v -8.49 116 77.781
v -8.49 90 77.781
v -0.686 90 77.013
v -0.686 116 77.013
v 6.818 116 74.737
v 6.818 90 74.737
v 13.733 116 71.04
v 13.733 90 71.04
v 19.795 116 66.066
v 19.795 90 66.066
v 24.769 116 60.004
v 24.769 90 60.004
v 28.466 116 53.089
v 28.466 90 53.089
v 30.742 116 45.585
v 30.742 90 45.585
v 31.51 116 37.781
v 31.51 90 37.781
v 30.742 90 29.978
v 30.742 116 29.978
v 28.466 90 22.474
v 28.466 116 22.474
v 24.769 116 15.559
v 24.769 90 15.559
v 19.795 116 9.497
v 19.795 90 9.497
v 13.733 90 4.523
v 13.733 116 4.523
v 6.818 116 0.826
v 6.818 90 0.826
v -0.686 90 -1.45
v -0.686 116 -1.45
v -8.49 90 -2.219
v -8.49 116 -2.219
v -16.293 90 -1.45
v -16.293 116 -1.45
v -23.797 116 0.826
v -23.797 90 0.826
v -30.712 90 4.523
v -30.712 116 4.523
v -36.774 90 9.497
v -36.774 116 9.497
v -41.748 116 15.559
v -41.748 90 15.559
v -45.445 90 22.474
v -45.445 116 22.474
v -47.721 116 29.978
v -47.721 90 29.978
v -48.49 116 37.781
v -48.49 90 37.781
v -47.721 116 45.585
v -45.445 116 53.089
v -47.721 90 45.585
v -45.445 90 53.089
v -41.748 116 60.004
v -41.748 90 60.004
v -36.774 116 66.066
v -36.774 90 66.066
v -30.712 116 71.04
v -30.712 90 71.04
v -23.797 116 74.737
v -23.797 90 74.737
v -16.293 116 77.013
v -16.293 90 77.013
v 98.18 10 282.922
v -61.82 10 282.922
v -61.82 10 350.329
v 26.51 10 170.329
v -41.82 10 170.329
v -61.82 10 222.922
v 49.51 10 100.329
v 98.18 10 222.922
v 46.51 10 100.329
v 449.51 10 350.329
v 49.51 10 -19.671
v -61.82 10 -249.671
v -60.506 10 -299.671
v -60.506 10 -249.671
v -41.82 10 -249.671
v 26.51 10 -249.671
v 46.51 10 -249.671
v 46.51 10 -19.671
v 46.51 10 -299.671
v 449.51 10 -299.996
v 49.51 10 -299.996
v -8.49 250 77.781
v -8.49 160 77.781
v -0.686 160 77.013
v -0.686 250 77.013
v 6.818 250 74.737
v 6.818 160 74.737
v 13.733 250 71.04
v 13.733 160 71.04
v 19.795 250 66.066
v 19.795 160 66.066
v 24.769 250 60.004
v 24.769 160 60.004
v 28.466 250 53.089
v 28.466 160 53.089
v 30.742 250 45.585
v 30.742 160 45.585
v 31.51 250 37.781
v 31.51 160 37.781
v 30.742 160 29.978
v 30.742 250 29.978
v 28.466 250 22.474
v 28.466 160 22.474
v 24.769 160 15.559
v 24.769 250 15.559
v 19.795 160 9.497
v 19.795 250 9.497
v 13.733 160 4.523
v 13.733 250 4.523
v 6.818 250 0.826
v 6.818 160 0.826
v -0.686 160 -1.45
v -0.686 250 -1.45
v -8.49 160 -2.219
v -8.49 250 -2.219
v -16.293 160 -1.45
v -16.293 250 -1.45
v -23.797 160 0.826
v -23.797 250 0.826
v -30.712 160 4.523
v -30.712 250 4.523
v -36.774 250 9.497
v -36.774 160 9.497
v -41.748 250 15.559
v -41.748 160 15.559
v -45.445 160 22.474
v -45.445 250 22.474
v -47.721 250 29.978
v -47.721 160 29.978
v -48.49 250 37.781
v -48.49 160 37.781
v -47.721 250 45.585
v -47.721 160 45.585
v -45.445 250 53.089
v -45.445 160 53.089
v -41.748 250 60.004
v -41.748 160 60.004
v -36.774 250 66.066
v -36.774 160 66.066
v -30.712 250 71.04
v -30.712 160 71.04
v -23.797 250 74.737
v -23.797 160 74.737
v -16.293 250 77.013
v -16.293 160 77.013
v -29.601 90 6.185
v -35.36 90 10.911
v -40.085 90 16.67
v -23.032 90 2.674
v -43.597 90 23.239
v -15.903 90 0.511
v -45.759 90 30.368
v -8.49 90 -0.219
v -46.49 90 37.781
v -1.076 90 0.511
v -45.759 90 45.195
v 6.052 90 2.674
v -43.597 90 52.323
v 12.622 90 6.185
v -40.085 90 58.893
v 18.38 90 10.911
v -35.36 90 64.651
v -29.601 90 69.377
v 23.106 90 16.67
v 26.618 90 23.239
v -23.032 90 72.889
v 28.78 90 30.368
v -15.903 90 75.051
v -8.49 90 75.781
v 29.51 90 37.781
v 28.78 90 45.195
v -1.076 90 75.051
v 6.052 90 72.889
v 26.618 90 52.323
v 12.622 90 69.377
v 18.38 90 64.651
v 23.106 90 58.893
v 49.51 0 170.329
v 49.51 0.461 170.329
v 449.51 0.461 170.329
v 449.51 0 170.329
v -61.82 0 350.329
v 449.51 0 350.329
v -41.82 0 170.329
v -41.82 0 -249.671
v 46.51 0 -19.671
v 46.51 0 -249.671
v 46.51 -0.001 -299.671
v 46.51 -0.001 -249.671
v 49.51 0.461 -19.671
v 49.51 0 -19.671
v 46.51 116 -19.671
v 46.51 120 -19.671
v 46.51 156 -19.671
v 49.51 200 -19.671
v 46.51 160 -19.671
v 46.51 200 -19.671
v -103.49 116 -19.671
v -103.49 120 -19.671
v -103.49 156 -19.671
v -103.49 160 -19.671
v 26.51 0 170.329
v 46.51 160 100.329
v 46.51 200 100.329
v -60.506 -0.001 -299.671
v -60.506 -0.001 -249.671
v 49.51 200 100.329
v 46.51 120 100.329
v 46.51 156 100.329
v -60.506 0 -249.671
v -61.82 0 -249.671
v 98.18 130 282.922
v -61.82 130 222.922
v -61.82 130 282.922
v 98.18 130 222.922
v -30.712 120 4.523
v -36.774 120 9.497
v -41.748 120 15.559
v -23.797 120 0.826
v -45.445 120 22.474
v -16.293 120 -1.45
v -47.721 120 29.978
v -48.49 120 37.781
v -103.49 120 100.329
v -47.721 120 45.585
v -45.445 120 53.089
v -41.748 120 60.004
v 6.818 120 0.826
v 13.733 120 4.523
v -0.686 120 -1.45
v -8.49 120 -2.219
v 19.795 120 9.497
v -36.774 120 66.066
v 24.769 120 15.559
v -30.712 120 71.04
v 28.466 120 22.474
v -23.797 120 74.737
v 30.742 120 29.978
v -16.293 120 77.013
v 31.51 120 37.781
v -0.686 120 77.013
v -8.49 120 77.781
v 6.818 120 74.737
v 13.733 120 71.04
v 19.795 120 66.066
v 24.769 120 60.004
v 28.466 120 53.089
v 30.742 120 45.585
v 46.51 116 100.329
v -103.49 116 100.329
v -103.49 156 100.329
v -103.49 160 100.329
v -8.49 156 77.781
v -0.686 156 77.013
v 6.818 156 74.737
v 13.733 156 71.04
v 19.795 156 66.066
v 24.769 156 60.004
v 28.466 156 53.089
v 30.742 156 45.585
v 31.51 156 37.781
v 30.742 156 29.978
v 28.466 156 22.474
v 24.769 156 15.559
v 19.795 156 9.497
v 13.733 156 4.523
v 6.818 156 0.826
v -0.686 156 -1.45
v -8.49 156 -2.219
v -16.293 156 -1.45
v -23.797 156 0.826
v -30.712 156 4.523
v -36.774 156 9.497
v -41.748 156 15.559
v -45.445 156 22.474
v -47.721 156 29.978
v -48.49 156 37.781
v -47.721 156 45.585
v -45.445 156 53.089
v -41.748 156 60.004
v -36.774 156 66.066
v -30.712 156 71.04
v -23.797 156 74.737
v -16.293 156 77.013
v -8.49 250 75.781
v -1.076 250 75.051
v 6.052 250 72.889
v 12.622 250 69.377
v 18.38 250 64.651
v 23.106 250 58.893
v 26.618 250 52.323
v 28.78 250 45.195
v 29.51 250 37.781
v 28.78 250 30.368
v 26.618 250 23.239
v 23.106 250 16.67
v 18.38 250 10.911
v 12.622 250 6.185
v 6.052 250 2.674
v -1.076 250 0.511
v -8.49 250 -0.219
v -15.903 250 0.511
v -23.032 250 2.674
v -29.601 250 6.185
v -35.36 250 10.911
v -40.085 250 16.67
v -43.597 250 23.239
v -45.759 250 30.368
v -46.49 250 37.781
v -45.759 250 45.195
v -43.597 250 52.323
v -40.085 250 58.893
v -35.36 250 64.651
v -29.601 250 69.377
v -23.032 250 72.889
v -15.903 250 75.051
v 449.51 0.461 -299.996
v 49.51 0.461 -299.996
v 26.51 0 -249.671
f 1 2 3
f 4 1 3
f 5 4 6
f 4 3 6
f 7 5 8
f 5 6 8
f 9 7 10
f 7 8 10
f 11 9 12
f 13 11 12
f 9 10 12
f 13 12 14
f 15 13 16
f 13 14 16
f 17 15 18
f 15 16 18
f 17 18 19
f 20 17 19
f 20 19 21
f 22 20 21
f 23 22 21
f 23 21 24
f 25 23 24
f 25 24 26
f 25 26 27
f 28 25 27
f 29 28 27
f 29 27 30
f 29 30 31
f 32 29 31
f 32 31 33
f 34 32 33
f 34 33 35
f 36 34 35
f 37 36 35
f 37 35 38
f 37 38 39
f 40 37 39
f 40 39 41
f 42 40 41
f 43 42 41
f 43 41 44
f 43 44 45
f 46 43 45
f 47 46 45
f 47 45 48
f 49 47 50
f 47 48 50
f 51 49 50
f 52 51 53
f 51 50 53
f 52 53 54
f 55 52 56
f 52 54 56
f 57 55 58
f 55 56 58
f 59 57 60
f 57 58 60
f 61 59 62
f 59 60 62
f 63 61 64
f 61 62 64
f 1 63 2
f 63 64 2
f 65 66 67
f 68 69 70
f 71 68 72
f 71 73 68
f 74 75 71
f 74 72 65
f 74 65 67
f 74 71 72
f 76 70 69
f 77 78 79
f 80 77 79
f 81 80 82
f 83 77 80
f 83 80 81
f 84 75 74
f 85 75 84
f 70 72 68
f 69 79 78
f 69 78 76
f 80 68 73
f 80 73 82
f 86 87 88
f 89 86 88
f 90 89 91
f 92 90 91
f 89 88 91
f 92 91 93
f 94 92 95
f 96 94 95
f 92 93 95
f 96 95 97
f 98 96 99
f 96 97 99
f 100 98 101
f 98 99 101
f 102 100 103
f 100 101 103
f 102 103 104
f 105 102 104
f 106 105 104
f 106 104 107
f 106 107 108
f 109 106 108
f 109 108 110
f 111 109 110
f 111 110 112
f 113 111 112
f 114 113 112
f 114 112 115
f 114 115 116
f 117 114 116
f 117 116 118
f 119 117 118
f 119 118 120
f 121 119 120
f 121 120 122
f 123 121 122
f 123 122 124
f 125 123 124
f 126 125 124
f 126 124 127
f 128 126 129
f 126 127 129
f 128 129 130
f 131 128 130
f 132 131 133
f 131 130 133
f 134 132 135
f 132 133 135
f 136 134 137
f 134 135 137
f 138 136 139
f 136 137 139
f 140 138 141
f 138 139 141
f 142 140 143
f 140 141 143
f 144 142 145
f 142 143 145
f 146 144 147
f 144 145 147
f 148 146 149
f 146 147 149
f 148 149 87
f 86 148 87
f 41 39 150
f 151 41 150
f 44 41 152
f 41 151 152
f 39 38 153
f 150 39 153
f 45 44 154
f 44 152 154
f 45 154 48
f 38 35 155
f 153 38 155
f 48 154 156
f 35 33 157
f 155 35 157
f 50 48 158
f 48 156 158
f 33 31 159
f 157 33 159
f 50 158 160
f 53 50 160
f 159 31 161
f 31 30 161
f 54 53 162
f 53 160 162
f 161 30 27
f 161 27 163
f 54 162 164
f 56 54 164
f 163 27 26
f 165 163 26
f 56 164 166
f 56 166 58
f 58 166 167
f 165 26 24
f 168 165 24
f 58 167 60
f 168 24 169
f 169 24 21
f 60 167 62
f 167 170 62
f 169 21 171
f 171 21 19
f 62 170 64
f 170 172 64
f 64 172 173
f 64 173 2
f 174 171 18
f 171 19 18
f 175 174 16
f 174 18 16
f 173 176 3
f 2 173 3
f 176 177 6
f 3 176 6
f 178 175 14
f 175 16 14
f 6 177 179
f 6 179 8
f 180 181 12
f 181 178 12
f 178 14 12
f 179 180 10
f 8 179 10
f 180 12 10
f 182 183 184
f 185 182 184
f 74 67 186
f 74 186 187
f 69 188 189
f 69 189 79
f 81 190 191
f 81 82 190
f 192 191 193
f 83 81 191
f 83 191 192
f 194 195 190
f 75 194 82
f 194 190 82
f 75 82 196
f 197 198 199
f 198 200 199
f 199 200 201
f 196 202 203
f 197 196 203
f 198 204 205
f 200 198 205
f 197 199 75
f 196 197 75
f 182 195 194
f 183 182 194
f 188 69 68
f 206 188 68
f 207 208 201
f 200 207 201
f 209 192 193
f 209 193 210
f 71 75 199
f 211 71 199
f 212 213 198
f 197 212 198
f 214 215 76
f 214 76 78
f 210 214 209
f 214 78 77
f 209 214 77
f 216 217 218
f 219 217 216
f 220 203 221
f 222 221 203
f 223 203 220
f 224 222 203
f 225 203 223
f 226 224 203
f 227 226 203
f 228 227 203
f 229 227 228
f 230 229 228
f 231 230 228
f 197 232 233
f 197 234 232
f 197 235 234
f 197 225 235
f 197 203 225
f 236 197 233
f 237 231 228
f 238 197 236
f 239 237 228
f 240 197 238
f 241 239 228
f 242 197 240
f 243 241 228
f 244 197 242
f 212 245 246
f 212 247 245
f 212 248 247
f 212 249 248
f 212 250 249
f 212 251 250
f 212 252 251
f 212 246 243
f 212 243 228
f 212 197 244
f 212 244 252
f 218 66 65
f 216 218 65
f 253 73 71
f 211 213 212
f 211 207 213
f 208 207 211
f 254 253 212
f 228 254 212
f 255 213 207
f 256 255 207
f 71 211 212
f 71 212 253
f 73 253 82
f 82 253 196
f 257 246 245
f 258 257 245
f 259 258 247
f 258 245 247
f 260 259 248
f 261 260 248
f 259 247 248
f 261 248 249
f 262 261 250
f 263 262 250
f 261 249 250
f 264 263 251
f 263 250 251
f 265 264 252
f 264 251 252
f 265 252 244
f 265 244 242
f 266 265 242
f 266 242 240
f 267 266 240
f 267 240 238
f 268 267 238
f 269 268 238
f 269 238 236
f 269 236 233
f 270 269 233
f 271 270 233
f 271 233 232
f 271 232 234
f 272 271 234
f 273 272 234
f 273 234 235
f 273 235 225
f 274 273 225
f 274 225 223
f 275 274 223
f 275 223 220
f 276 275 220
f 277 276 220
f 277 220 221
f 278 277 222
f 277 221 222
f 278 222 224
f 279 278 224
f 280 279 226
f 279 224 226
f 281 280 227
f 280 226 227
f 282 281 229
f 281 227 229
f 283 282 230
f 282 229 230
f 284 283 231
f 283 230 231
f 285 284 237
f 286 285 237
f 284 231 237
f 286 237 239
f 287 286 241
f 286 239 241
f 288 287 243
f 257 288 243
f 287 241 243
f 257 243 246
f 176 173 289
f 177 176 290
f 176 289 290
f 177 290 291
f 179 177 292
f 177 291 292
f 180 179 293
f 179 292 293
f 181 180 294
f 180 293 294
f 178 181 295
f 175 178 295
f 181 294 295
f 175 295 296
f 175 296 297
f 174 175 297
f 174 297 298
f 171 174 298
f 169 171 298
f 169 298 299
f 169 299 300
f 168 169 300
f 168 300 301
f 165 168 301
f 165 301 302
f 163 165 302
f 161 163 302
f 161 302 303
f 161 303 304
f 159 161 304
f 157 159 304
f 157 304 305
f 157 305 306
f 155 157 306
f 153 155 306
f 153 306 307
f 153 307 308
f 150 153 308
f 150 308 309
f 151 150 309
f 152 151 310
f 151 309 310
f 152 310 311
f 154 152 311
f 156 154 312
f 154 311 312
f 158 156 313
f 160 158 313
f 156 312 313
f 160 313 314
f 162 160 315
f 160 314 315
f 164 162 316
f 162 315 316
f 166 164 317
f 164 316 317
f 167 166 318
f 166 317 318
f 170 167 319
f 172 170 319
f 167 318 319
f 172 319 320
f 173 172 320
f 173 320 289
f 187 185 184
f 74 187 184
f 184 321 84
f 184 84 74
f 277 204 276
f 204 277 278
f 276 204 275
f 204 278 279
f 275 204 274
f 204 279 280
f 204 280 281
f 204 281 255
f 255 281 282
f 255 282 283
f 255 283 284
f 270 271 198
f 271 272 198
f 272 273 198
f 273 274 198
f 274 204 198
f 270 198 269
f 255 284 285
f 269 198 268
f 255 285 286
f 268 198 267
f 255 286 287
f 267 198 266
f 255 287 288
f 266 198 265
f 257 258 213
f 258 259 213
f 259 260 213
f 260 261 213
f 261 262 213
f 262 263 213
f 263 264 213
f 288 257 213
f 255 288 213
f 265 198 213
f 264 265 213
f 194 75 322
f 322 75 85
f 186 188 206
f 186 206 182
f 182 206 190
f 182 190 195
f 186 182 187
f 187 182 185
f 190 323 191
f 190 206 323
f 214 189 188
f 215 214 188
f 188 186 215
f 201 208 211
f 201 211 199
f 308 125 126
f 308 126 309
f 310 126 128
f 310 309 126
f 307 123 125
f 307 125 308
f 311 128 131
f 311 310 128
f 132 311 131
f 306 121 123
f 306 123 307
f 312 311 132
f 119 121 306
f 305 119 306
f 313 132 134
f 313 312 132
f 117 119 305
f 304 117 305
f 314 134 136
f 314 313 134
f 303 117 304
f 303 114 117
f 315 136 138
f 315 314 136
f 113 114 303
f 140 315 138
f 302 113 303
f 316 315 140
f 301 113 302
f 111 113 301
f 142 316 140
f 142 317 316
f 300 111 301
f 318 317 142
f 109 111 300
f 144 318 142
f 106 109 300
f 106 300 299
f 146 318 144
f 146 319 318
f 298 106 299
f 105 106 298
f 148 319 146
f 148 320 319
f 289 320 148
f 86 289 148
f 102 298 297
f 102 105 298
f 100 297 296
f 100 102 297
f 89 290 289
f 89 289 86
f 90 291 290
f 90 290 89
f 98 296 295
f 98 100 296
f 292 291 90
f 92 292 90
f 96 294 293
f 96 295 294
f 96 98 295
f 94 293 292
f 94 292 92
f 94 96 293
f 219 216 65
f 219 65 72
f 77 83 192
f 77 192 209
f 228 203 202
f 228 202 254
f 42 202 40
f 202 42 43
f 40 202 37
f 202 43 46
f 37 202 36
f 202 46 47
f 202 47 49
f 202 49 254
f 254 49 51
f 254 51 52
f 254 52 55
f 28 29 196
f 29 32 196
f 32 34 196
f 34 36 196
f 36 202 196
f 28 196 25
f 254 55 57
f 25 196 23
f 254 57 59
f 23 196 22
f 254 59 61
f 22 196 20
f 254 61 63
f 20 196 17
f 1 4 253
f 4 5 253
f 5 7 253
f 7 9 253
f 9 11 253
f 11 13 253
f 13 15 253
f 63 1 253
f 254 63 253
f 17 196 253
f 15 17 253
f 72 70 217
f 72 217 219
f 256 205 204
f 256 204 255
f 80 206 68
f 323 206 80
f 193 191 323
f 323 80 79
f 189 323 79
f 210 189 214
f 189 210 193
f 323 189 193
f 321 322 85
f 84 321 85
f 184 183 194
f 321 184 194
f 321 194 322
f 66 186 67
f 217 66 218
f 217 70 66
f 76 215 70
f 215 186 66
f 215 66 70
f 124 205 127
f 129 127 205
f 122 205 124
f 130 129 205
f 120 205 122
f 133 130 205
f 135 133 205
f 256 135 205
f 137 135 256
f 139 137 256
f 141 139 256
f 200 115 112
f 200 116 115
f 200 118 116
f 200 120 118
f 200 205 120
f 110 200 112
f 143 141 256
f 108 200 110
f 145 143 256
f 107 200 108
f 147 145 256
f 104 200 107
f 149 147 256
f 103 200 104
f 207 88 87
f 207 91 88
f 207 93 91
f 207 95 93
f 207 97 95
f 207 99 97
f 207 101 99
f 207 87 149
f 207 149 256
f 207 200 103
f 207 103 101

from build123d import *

# Parameters (mm, degrees)
SKETCH1_W                = 20
SKETCH1_H                = 350
BOSS_EXTRUDE1_DEPTH      = 10
BOSS_EXTRUDE1_2_DEPTH    = 10
BOSS_EXTRUDE2_DEPTH      = 0.001
BOSS_EXTRUDE2_DEPTH_BACK = 10
SKETCH2_W                = 107.015982705
SKETCH2_H                = 50
SKETCH3_W                = 120
SKETCH3_H                = 200
BOSS_EXTRUDE3_DEPTH      = 3
SKETCH4_W                = 120
SKETCH4_H                = 4
BOSS_EXTRUDE4_DEPTH      = 150
SKETCH5_R                = 40
CUT_EXTRUDE1_DEPTH       = 90
BOSS_EXTRUDE5_DEPTH      = 90
BOSS_EXTRUDE5_DEPTH_BACK = 70
SKETCH6_R                = 40
SKETCH7_R                = 38
CUT_EXTRUDE2_DEPTH       = 176
SKETCH8_W                = 20
SKETCH8_H                = 10
SKETCH8_W_2              = 23
BOSS_EXTRUDE6_DEPTH      = 70
SKETCH9_W                = 470.324280976
SKETCH9_H                = 9.538817488
BOSS_EXTRUDE7_DEPTH      = 400
SKETCH10_W               = 511.33
SKETCH10_H               = 10
BOSS_EXTRUDE8_DEPTH      = 180
SKETCH11_W               = 160
SKETCH11_H               = 60
BOSS_EXTRUDE9_DEPTH      = 120


with BuildPart() as part:
    # Sketch1 → Boss-Extrude1 (new body)
    with BuildSketch(Plane(origin=(0, 0, 0), x_dir=(1, 0, 0), z_dir=(0, 1, 0))):
        with Locations((-51.819592314, 74.671278777)):
            Rectangle(SKETCH1_W, SKETCH1_H)
    extrude(amount=BOSS_EXTRUDE1_DEPTH)



with BuildPart() as body_2:
    # Sketch1 → Boss-Extrude1 2 (new body)
    with BuildSketch(Plane(origin=(0, 0, 0), x_dir=(1, 0, 0), z_dir=(0, 1, 0))):
        with Locations((36.510407686, 74.671278777)):
            Rectangle(SKETCH1_W, SKETCH1_H)
    extrude(amount=BOSS_EXTRUDE1_2_DEPTH)


with BuildPart() as part_1:
    add(part.part)

    add(body_2.part)  # Boss-Extrude2 merges body 2
    # Sketch2 → Boss-Extrude2 (add, two sides: drawn at the far end of the back side and taken through both)
    with BuildSketch(Plane(origin=(0, 0, 0), x_dir=(-1, 0, 0), z_dir=(0, -1, 0)).offset(-BOSS_EXTRUDE2_DEPTH_BACK)):
        with Locations((6.997583667, 274.671278777)):
            Rectangle(SKETCH2_W, SKETCH2_H)
    extrude(amount=BOSS_EXTRUDE2_DEPTH + BOSS_EXTRUDE2_DEPTH_BACK)

    # Sketch3 → Boss-Extrude3 (add)
    with BuildSketch(Plane(origin=(46.510407686, 0, 0), x_dir=(0, 0, -1), z_dir=(1, 0, 0))):
        with Locations((-40.328721223, 100)):
            Rectangle(SKETCH3_W, SKETCH3_H)
    extrude(amount=BOSS_EXTRUDE3_DEPTH)

    # Sketch4 → Boss-Extrude4 (add)
    with BuildSketch(Plane.ZY.offset(-46.510407686)):
        with Locations((40.328721223, 158)):
            Rectangle(SKETCH4_W, SKETCH4_H)
        with Locations((40.328721223, 118)):
            Rectangle(SKETCH4_W, SKETCH4_H)
    extrude(amount=BOSS_EXTRUDE4_DEPTH)

    # Sketch5 → Cut-Extrude1 (cut)
    with BuildSketch(Plane(origin=(0, 160, 0), x_dir=(1, 0, 0), z_dir=(0, 1, 0))):
        with Locations(Location((-8.489592314, -37.781336818, 0), (0, 0, 270))):
            Circle(SKETCH5_R)
    extrude(amount=-CUT_EXTRUDE1_DEPTH, mode=Mode.SUBTRACT)

    # Sketch6 → Boss-Extrude5 (add, two sides: drawn at the far end of the back side and taken through both)
    with BuildSketch(Plane(origin=(0, 160, 0), x_dir=(1, 0, 0), z_dir=(0, 1, 0)).offset(-BOSS_EXTRUDE5_DEPTH_BACK)):
        with Locations(Location((-8.489592314, -37.781336818, 0), (0, 0, 270))):
            Circle(SKETCH6_R)
    extrude(amount=BOSS_EXTRUDE5_DEPTH + BOSS_EXTRUDE5_DEPTH_BACK)

    # Sketch7 → Cut-Extrude2 (cut)
    with BuildSketch(Plane(origin=(0, 250, 0), x_dir=(1, 0, 0), z_dir=(0, 1, 0))):
        with Locations(Location((-8.489592314, -37.781336818, 0), (0, 0, 270))):
            Circle(SKETCH7_R)
    extrude(amount=-CUT_EXTRUDE2_DEPTH, mode=Mode.SUBTRACT)

    # Sketch8 → Boss-Extrude6 (add)
    with BuildSketch(Plane.XY.offset(100.328721223)):
        with Locations((-51.819592314, 5)):
            Rectangle(SKETCH8_W, SKETCH8_H)
        with Locations((38.010407686, 5)):
            Rectangle(SKETCH8_W_2, SKETCH8_H)
    extrude(amount=BOSS_EXTRUDE6_DEPTH)

    # Sketch9 → Boss-Extrude7 (add)
    with BuildSketch(Plane(origin=(49.510407686, 0, 0), x_dir=(0, 0, -1), z_dir=(1, 0, 0))):
        with Locations((64.833419265, 5.230591256)):
            Rectangle(SKETCH9_W, SKETCH9_H)
    extrude(amount=BOSS_EXTRUDE7_DEPTH)

    # Sketch10 → Boss-Extrude8 (add)
    with BuildSketch(Plane.XY.offset(170.328721223)):
        with Locations((193.845407686, 5)):
            Rectangle(SKETCH10_W, SKETCH10_H)
    extrude(amount=BOSS_EXTRUDE8_DEPTH)

    # Sketch11 → Boss-Extrude9 (add)
    with BuildSketch(Plane(origin=(0, 10, 0), x_dir=(1, 0, 0), z_dir=(0, 1, 0))):
        with Locations((18.180407686, -252.921925031)):
            Rectangle(SKETCH11_W, SKETCH11_H)
    extrude(amount=BOSS_EXTRUDE9_DEPTH)


solid = part_1.part
